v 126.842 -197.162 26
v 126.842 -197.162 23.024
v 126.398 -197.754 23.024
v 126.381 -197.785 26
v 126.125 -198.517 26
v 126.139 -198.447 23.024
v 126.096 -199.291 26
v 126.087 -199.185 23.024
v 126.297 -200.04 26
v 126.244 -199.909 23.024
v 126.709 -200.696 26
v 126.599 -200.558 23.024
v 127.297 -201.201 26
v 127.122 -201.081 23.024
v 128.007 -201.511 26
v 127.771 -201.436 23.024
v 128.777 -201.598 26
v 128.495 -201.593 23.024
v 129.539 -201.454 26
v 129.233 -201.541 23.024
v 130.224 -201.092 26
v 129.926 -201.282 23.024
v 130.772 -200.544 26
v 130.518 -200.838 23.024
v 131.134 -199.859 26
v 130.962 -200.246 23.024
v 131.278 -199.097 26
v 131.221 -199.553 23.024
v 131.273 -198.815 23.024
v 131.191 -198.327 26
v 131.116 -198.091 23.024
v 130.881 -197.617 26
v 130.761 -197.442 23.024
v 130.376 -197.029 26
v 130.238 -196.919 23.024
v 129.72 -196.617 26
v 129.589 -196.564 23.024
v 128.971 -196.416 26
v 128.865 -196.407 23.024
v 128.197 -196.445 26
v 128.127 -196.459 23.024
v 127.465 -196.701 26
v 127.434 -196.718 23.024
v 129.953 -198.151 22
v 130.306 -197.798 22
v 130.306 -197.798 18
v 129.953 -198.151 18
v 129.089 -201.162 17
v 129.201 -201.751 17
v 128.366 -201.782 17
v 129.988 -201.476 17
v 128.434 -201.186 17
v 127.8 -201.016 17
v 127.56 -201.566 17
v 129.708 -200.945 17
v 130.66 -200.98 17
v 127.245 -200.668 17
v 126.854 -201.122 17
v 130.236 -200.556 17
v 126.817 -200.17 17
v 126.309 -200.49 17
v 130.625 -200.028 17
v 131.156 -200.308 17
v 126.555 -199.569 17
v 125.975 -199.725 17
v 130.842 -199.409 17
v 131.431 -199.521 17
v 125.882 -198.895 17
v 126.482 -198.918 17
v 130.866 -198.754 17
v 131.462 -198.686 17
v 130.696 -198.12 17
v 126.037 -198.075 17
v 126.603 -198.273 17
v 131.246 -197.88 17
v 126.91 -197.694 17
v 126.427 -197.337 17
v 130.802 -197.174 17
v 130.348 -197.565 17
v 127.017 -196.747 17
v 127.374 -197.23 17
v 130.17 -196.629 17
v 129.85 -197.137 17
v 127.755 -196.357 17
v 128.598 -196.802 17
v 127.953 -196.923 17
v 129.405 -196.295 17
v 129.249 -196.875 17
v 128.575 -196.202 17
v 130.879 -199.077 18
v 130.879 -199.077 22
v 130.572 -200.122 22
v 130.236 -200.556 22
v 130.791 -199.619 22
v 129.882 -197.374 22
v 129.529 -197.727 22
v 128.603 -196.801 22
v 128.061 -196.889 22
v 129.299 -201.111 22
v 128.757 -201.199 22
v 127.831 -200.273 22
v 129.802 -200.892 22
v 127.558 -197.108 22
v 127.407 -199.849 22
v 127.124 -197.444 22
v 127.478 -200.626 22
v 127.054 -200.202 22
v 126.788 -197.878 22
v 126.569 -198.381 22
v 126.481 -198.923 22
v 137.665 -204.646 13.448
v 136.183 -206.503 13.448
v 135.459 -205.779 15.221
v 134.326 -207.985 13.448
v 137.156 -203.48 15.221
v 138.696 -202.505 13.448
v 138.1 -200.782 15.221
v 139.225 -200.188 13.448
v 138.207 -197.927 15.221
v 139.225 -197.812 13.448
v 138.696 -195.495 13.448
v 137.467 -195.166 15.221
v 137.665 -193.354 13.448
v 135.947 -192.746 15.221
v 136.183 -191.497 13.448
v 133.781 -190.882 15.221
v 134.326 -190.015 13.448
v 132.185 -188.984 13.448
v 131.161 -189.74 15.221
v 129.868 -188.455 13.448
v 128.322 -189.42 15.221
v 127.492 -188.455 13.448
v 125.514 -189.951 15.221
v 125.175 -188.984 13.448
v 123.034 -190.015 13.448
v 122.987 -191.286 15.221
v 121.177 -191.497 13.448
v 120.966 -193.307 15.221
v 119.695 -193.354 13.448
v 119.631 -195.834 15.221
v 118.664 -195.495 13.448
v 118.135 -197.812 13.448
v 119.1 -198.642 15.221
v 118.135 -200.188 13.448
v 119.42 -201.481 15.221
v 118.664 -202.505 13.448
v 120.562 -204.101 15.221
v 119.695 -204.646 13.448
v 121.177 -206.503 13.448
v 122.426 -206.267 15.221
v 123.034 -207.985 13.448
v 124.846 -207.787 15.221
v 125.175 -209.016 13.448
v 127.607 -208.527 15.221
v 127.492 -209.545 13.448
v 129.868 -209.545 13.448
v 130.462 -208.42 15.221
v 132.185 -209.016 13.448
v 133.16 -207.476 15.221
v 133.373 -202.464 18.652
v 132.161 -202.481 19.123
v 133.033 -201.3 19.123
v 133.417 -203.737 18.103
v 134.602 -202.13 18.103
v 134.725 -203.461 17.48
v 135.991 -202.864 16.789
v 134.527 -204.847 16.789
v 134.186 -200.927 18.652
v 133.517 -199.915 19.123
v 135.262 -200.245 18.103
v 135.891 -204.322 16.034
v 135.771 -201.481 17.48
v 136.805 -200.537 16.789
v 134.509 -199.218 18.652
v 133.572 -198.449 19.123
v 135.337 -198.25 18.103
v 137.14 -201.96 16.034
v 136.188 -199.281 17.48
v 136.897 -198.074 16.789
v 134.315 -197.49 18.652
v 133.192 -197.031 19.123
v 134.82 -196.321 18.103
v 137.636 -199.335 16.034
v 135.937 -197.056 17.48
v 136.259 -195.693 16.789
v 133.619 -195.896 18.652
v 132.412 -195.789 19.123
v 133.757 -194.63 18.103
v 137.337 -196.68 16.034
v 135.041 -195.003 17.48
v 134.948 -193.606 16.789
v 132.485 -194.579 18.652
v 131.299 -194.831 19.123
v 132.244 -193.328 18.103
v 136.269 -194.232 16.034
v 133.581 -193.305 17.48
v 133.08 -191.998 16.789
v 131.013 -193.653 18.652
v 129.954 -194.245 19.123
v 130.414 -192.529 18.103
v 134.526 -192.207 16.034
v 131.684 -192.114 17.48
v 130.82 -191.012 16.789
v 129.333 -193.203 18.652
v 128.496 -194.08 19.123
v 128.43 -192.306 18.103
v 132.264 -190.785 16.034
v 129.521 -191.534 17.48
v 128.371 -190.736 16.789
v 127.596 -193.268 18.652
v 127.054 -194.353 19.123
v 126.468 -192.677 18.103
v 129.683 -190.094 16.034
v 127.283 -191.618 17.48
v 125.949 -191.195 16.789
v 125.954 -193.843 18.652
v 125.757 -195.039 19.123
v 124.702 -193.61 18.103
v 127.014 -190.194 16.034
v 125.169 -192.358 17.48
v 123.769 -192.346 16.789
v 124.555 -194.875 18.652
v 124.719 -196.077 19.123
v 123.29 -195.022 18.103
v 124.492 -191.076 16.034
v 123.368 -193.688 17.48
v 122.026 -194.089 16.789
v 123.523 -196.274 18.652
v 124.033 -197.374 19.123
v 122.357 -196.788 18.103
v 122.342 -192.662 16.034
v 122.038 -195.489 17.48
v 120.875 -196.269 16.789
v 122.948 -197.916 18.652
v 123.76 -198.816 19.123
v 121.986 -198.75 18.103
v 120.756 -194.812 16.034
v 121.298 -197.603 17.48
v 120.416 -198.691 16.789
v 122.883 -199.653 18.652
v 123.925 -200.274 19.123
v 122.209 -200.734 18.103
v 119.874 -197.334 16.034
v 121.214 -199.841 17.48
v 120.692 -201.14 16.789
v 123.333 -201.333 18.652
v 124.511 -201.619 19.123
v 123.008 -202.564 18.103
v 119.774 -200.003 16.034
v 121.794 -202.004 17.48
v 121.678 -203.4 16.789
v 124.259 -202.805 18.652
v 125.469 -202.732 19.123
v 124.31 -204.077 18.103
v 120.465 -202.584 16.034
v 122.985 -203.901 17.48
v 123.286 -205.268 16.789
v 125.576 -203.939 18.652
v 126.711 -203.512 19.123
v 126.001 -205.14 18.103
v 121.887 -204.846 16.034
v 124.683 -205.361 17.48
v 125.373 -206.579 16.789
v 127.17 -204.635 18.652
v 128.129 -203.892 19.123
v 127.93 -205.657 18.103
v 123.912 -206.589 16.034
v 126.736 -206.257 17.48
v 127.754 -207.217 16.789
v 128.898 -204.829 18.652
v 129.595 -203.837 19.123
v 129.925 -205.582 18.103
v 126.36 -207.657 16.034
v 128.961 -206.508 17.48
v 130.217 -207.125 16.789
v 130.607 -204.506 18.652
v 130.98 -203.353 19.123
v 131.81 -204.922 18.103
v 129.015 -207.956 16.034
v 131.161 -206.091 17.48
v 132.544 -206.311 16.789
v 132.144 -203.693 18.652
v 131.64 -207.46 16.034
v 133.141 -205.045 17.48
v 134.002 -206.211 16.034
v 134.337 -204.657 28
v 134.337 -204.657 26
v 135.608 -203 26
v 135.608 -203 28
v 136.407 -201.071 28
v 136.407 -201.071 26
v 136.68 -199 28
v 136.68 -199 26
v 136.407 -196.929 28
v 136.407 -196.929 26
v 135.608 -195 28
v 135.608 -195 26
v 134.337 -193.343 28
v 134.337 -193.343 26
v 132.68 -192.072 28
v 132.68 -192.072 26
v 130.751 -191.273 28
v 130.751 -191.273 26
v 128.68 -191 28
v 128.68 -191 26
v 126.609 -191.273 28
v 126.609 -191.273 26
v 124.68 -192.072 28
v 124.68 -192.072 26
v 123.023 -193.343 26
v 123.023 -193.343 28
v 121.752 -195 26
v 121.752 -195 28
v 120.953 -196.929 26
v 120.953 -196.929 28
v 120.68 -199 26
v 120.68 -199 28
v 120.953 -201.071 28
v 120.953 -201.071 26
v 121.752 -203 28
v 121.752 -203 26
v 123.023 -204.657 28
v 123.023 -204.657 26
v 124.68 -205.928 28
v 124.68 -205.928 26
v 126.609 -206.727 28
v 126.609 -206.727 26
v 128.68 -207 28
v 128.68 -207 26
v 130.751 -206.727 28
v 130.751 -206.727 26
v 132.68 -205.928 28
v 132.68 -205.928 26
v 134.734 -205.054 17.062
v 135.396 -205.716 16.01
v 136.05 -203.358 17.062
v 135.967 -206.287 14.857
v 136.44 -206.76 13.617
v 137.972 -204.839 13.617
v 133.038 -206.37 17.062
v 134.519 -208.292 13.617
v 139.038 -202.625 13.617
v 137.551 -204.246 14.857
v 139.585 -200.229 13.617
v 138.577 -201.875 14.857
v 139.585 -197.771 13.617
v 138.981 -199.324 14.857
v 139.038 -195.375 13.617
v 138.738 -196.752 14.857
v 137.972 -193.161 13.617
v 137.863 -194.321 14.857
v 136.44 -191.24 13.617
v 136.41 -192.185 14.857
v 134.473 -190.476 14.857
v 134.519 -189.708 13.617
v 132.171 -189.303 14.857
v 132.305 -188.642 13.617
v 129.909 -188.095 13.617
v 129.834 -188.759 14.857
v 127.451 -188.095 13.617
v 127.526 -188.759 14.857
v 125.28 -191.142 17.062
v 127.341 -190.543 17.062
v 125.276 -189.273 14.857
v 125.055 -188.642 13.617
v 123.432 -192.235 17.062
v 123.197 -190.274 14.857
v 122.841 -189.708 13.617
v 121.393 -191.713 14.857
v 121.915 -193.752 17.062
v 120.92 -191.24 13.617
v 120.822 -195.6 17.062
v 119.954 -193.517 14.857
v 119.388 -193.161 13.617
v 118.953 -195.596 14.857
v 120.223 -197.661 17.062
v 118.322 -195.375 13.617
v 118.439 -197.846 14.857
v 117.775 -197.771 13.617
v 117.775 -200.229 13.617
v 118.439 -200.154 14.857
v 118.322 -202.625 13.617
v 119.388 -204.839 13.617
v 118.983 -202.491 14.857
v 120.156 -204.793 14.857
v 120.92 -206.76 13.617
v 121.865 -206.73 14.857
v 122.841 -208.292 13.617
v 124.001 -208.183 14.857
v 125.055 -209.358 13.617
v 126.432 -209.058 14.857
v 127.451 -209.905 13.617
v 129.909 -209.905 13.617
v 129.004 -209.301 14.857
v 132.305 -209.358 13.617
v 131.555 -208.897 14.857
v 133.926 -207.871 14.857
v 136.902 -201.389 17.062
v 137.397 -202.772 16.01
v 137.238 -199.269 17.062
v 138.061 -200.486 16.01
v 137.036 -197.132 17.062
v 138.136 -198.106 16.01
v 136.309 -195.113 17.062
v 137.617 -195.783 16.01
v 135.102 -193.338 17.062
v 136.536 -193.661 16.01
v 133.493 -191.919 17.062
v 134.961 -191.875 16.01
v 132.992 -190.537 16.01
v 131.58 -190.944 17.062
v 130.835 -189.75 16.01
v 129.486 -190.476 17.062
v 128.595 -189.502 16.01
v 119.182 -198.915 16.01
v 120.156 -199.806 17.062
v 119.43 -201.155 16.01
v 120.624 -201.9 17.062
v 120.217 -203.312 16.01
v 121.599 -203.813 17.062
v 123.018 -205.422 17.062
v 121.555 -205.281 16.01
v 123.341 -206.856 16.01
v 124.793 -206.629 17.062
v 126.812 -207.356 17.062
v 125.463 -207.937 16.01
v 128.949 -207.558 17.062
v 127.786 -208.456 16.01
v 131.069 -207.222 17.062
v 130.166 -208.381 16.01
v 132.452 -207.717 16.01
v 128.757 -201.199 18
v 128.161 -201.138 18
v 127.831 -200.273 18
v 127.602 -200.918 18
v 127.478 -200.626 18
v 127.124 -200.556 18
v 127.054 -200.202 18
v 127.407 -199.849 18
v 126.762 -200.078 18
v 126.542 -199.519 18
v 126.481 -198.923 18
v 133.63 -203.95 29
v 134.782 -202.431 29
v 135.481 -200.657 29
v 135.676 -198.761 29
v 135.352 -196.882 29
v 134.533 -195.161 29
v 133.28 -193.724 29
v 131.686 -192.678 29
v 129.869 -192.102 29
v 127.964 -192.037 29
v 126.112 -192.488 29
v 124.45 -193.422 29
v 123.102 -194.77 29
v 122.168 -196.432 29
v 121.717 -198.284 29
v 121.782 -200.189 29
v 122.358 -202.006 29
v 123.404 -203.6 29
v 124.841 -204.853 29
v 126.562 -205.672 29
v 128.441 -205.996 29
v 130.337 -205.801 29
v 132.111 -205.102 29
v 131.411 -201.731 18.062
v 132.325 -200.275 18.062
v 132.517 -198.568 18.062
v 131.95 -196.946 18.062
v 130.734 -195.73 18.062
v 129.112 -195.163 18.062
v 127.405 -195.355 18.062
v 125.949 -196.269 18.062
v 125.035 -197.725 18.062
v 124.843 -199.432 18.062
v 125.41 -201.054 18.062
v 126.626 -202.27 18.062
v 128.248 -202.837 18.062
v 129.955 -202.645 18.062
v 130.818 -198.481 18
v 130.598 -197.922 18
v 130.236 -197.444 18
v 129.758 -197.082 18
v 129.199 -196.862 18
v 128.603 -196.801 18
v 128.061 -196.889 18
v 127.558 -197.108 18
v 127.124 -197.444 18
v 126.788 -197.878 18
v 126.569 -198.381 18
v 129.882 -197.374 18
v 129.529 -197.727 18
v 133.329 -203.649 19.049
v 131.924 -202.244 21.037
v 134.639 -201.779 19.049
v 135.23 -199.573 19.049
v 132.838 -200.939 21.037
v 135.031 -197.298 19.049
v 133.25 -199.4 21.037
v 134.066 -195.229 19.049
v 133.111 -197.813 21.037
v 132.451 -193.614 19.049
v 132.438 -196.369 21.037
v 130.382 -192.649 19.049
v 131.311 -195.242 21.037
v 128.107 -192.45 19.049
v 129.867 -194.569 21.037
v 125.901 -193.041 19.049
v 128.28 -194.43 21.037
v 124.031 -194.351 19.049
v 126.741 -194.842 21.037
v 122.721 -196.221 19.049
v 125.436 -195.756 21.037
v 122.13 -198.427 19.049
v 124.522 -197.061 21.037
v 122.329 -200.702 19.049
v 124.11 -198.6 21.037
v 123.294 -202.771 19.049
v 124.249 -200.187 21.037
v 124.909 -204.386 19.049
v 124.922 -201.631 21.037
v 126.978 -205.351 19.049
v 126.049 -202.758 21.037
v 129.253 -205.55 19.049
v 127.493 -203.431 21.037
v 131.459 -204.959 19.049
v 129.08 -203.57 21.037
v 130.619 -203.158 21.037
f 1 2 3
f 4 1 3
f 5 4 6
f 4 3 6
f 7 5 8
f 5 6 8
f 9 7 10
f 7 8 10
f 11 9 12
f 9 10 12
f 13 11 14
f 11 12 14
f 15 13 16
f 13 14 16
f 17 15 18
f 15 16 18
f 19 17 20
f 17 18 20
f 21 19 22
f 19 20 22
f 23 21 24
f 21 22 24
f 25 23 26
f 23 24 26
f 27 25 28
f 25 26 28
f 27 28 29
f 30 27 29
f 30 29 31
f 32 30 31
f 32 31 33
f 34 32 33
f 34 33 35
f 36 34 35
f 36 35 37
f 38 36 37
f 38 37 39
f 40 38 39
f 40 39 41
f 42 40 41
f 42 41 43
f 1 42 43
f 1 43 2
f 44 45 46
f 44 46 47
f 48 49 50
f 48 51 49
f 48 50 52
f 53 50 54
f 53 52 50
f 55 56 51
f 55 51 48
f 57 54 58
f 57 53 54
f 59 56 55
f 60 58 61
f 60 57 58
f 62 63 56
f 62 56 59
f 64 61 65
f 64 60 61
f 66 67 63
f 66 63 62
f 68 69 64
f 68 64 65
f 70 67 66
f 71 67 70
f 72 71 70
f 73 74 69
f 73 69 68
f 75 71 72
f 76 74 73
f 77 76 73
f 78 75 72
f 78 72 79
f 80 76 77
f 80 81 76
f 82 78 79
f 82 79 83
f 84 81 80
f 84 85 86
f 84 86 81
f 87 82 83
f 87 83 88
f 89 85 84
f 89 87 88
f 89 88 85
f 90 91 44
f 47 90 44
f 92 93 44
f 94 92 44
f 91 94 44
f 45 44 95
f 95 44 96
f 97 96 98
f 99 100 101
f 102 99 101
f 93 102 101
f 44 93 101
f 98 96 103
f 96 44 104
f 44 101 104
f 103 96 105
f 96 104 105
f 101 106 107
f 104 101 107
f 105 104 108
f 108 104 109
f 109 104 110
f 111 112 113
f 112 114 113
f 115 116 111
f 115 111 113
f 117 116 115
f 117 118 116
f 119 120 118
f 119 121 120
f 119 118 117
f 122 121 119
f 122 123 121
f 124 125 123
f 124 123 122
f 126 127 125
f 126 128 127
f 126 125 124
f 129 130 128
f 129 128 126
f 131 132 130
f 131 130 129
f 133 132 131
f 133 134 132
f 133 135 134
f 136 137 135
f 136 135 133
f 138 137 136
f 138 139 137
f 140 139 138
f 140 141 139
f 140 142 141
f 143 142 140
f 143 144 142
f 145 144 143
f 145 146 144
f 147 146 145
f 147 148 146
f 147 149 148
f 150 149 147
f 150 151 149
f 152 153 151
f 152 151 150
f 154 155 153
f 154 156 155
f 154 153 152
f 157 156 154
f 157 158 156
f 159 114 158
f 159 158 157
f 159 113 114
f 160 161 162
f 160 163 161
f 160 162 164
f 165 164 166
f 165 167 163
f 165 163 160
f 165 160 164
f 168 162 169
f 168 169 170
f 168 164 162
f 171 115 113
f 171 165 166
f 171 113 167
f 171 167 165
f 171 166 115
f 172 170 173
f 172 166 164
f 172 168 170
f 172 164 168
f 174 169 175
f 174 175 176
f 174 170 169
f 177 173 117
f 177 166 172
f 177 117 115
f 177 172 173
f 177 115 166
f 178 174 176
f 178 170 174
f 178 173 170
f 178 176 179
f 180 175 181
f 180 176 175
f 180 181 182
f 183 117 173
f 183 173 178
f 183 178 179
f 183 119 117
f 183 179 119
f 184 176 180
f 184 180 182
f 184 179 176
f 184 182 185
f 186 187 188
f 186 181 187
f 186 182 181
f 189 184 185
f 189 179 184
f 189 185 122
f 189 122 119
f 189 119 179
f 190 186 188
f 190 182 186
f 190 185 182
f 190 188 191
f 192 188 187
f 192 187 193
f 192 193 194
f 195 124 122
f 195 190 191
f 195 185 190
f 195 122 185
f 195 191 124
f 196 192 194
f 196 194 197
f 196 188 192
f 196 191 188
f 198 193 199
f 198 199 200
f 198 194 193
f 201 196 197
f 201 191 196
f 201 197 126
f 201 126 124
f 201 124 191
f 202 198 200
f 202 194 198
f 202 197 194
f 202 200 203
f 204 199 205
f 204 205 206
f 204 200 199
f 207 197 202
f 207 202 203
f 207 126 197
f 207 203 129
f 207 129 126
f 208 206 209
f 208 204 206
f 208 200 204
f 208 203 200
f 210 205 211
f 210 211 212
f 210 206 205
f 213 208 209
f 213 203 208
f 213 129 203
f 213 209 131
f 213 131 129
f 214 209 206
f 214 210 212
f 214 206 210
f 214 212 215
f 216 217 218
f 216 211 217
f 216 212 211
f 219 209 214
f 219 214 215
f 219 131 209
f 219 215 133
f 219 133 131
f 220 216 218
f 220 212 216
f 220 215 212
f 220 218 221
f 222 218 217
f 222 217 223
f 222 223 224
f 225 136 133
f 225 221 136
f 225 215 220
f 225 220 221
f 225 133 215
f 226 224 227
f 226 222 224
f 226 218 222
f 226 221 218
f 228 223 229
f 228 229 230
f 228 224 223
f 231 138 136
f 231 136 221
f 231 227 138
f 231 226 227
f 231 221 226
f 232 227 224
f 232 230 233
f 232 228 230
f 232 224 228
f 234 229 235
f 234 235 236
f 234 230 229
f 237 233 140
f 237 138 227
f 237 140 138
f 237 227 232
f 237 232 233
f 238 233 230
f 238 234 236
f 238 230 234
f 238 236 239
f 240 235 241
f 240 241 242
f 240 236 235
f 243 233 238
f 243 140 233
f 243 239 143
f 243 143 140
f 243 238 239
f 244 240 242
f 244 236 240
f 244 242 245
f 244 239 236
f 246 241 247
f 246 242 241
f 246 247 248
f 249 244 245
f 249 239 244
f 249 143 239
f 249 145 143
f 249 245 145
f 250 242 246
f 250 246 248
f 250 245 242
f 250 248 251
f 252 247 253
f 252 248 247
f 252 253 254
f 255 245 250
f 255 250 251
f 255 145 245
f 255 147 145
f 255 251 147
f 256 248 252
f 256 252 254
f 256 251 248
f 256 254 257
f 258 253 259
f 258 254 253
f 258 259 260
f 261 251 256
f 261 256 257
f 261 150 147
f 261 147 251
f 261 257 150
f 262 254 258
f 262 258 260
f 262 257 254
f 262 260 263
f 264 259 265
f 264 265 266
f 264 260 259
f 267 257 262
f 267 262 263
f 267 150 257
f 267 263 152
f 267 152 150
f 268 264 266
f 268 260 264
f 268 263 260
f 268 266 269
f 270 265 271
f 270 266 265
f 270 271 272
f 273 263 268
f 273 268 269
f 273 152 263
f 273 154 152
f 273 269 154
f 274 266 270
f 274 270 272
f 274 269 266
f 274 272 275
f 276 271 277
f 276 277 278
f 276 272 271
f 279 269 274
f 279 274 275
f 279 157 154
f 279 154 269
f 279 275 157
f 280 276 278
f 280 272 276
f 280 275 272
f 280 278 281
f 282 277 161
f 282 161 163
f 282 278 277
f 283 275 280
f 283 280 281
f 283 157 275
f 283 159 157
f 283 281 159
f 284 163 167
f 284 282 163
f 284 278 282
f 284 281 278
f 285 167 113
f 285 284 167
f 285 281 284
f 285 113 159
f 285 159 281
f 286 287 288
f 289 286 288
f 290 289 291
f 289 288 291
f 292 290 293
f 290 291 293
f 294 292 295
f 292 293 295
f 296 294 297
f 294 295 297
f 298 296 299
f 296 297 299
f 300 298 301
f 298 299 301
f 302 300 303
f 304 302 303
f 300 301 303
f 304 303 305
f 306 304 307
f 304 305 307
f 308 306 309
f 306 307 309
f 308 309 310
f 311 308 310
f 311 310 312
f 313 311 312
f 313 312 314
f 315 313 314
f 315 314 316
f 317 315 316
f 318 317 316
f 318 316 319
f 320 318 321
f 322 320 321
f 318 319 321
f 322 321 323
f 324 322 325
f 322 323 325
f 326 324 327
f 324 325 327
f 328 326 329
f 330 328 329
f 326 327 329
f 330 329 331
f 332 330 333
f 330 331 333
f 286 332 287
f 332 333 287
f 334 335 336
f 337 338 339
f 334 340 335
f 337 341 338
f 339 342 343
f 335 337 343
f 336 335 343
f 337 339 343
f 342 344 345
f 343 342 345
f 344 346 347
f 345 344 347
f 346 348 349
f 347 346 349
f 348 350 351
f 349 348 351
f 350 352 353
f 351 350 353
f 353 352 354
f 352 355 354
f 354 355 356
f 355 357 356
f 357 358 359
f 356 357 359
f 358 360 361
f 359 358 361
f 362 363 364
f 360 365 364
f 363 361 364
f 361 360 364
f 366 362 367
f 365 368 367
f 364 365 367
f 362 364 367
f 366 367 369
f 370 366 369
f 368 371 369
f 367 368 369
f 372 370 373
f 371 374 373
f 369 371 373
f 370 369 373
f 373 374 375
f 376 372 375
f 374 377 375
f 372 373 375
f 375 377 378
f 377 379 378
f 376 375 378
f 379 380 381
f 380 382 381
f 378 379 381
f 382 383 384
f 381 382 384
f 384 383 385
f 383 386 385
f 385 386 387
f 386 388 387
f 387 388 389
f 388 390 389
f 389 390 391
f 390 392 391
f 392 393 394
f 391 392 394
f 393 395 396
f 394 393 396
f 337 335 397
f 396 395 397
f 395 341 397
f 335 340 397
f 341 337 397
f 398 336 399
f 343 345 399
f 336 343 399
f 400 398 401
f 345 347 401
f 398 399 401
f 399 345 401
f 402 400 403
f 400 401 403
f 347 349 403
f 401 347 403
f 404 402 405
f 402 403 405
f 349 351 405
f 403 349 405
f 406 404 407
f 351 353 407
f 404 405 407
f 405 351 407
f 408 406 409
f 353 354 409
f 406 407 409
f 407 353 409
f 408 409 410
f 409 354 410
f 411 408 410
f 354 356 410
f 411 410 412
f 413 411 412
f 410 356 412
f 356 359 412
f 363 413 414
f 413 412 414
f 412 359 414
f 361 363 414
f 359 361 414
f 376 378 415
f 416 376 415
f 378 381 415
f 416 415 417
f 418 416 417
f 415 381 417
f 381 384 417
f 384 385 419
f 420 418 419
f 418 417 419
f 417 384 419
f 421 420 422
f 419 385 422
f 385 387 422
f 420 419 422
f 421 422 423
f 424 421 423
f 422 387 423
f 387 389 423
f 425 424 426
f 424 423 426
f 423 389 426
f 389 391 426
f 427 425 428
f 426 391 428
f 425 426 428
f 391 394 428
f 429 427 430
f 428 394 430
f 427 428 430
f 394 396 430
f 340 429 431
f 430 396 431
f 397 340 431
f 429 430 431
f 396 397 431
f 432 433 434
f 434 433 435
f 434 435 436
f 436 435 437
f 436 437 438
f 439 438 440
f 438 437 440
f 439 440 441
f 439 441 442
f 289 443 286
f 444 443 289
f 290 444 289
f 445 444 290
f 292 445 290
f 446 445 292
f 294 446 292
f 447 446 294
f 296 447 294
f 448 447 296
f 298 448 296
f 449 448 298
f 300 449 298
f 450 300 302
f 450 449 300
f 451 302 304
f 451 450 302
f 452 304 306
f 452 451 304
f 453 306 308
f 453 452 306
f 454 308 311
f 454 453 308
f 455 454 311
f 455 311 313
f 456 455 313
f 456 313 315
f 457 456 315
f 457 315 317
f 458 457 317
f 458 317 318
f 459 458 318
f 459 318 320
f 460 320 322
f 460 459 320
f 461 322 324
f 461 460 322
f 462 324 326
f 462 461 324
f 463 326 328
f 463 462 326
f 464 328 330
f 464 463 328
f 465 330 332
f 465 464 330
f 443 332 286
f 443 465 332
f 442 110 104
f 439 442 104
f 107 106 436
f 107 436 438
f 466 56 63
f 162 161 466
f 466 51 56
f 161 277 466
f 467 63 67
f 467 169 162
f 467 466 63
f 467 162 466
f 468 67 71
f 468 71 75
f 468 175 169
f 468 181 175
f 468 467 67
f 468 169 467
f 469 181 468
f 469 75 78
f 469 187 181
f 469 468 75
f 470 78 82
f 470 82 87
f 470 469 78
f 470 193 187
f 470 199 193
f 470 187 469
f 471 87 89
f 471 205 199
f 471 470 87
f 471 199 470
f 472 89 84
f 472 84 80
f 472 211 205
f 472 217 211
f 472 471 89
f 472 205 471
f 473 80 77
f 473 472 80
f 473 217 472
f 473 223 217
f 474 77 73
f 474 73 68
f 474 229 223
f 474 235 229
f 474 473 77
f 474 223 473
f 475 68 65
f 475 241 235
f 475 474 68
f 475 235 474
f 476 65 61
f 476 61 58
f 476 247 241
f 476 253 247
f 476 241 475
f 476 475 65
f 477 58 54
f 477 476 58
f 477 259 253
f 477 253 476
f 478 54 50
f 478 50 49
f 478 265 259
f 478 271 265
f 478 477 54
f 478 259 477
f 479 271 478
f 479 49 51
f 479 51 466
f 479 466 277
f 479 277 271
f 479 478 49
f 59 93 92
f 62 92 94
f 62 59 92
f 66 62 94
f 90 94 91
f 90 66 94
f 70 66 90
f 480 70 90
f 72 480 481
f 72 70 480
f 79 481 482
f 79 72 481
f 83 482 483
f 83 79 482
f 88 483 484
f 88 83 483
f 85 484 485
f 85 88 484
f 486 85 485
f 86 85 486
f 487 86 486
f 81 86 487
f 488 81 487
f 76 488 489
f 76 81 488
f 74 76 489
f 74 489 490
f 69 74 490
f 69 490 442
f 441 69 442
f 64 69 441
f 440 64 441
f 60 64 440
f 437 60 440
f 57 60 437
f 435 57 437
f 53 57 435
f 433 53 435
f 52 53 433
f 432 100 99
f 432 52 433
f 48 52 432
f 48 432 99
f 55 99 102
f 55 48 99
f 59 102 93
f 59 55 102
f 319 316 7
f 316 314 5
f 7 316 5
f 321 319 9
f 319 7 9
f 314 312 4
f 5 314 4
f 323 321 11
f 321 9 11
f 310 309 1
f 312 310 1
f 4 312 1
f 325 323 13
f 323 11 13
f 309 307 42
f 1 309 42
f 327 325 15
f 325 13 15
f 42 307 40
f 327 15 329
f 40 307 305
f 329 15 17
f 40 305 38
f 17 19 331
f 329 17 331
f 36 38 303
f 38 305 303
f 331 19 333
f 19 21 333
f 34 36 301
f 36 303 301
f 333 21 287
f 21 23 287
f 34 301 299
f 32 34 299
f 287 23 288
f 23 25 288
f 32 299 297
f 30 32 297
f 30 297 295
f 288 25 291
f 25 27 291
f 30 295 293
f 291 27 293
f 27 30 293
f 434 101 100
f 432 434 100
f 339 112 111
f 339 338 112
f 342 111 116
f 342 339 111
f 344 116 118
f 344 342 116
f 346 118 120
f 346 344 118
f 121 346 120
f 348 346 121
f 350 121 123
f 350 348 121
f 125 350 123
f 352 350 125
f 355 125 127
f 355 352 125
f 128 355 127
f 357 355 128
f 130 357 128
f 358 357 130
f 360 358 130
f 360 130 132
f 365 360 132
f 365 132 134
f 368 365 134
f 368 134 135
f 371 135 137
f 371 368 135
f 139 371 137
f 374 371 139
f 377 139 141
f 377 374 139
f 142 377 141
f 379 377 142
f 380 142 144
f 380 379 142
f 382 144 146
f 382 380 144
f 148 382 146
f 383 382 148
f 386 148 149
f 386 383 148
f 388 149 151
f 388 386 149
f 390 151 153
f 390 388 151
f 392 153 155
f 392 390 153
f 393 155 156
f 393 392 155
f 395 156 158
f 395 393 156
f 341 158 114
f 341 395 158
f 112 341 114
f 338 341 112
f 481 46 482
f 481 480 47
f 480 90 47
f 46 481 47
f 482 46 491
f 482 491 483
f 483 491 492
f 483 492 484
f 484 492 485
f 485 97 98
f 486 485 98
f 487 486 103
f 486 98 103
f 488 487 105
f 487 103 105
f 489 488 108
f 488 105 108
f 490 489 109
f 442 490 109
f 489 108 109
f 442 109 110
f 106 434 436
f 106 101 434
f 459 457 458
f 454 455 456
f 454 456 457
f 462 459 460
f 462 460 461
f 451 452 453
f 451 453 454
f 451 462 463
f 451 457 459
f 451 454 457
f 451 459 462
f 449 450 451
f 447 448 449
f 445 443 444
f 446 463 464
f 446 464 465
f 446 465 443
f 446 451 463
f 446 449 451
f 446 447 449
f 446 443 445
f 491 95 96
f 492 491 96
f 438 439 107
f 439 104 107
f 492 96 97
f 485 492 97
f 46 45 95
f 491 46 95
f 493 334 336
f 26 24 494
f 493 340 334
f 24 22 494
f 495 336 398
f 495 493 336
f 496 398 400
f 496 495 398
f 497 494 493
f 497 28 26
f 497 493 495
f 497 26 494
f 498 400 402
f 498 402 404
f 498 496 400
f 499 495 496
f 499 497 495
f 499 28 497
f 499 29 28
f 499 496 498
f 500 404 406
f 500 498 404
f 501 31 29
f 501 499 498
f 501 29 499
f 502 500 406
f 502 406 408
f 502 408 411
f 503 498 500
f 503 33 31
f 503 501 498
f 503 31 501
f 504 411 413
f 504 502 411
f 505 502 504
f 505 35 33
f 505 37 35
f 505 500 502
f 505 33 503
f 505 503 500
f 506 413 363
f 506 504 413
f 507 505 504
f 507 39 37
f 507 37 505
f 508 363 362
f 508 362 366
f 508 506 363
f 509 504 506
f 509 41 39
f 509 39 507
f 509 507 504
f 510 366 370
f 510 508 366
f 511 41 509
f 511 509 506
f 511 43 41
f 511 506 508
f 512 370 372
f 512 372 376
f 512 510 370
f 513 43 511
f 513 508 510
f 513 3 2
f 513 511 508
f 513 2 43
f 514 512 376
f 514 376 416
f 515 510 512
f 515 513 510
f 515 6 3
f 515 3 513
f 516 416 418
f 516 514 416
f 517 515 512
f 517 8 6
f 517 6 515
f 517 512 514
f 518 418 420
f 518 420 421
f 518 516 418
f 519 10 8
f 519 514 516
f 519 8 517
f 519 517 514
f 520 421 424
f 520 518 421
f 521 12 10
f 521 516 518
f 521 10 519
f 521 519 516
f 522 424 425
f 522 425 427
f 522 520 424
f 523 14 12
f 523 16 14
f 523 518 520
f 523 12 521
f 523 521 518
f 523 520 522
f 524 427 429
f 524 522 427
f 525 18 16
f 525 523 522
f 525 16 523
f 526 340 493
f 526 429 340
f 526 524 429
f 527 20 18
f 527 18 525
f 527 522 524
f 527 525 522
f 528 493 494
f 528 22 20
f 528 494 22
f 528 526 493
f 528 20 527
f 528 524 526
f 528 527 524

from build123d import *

# Parameters (mm, degrees)
SKETCH033_R             = 3
PAD015_DEPTH            = 4
SKETCH035_W             = 0.6
SKETCH035_H             = 4
POCKET014_DEPTH         = 8.552756
SKETCH008_R             = 2.6
PAD016_DEPTH            = 4
SKETCH034_R             = 8
PAD017_DEPTH            = 3
CHAMFER010_SIZE         = 1
BODY005_PLACEMENT_ANGLE = 135


with BuildPart() as part:
    # Sketch032 → Revolution (revolve)
    with BuildSketch(Plane.XZ):
        with BuildLine():
            Line((-2.2, 0), (-2.2, -2))
            Line((-2.2, -2), (-2.2, -5))
            Line((-2.2, -5), (-2.8, -5))
            Line((-2.8, -5), (-4.923191, -2.876809))
            ThreePointArc((-4.923191, -2.876809), (-8.269417, -5.211047), (-10.611545, -8.551756))
            Line((-10.611545, -8.551756), (-10.974068, -8.382708))
            ThreePointArc((-8.562033, -4.937967), (-9.918738, -6.554825), (-10.974068, -8.382708))
            Line((-8.562033, -4.937967), (-2.6, 1.024067))
            Line((-2.6, 1.024067), (-2.6, 0))
            Line((-2.6, 0), (-2.2, 0))
        make_face()
    revolve(axis=Axis((0, 0, 0), (0, 0, 1)))

    # Sketch033 → Pad015 (new body)
    with BuildSketch(Plane.XY):
        Circle(SKETCH033_R)
        with BuildLine():
            Line((1.609348, 1.5), (-1.609348, 1.5))
            ThreePointArc((-1.609348, 1.5), (-2.2, 0), (-1.609348, -1.5))
            Line((-1.609348, -1.5), (1.609348, -1.5))
            ThreePointArc((1.609348, -1.5), (2.2, 0), (1.609348, 1.5))
        make_face(mode=Mode.SUBTRACT)
    extrude(amount=-PAD015_DEPTH)

    # Sketch035 → Pocket014 (cut, through all)
    with BuildSketch(Plane.XY):
        Rectangle(SKETCH035_W, SKETCH035_H)
    extrude(amount=-POCKET014_DEPTH, mode=Mode.SUBTRACT)

    # Sketch008 → Pad016 (join)
    with BuildSketch(Plane.XY):
        Circle(SKETCH008_R)
    extrude(amount=PAD016_DEPTH)

    # Sketch034 (on Face4 of Pad016) → Pad017 (join)
    with BuildSketch(Plane(origin=(0, 0, 4), x_dir=(-1, 0, 0), z_dir=(0, 0, 1))):
        Circle(SKETCH034_R)
    extrude(amount=PAD017_DEPTH)

    # Chamfer010
    chamfer010_edges = [part.edges().sort_by_distance(p)[0] for p in [
        (8, 0, 7),
    ]]
    chamfer(chamfer010_edges, length=CHAMFER010_SIZE)


with BuildPart() as part_1:
    # Body005 placement: moved
    add(part.part.moved(Location((128.68, -199, 22))).rotate(Axis((128.68, -199, 22), (0, 0, 1)), BODY005_PLACEMENT_ANGLE))


solid = part_1.part
